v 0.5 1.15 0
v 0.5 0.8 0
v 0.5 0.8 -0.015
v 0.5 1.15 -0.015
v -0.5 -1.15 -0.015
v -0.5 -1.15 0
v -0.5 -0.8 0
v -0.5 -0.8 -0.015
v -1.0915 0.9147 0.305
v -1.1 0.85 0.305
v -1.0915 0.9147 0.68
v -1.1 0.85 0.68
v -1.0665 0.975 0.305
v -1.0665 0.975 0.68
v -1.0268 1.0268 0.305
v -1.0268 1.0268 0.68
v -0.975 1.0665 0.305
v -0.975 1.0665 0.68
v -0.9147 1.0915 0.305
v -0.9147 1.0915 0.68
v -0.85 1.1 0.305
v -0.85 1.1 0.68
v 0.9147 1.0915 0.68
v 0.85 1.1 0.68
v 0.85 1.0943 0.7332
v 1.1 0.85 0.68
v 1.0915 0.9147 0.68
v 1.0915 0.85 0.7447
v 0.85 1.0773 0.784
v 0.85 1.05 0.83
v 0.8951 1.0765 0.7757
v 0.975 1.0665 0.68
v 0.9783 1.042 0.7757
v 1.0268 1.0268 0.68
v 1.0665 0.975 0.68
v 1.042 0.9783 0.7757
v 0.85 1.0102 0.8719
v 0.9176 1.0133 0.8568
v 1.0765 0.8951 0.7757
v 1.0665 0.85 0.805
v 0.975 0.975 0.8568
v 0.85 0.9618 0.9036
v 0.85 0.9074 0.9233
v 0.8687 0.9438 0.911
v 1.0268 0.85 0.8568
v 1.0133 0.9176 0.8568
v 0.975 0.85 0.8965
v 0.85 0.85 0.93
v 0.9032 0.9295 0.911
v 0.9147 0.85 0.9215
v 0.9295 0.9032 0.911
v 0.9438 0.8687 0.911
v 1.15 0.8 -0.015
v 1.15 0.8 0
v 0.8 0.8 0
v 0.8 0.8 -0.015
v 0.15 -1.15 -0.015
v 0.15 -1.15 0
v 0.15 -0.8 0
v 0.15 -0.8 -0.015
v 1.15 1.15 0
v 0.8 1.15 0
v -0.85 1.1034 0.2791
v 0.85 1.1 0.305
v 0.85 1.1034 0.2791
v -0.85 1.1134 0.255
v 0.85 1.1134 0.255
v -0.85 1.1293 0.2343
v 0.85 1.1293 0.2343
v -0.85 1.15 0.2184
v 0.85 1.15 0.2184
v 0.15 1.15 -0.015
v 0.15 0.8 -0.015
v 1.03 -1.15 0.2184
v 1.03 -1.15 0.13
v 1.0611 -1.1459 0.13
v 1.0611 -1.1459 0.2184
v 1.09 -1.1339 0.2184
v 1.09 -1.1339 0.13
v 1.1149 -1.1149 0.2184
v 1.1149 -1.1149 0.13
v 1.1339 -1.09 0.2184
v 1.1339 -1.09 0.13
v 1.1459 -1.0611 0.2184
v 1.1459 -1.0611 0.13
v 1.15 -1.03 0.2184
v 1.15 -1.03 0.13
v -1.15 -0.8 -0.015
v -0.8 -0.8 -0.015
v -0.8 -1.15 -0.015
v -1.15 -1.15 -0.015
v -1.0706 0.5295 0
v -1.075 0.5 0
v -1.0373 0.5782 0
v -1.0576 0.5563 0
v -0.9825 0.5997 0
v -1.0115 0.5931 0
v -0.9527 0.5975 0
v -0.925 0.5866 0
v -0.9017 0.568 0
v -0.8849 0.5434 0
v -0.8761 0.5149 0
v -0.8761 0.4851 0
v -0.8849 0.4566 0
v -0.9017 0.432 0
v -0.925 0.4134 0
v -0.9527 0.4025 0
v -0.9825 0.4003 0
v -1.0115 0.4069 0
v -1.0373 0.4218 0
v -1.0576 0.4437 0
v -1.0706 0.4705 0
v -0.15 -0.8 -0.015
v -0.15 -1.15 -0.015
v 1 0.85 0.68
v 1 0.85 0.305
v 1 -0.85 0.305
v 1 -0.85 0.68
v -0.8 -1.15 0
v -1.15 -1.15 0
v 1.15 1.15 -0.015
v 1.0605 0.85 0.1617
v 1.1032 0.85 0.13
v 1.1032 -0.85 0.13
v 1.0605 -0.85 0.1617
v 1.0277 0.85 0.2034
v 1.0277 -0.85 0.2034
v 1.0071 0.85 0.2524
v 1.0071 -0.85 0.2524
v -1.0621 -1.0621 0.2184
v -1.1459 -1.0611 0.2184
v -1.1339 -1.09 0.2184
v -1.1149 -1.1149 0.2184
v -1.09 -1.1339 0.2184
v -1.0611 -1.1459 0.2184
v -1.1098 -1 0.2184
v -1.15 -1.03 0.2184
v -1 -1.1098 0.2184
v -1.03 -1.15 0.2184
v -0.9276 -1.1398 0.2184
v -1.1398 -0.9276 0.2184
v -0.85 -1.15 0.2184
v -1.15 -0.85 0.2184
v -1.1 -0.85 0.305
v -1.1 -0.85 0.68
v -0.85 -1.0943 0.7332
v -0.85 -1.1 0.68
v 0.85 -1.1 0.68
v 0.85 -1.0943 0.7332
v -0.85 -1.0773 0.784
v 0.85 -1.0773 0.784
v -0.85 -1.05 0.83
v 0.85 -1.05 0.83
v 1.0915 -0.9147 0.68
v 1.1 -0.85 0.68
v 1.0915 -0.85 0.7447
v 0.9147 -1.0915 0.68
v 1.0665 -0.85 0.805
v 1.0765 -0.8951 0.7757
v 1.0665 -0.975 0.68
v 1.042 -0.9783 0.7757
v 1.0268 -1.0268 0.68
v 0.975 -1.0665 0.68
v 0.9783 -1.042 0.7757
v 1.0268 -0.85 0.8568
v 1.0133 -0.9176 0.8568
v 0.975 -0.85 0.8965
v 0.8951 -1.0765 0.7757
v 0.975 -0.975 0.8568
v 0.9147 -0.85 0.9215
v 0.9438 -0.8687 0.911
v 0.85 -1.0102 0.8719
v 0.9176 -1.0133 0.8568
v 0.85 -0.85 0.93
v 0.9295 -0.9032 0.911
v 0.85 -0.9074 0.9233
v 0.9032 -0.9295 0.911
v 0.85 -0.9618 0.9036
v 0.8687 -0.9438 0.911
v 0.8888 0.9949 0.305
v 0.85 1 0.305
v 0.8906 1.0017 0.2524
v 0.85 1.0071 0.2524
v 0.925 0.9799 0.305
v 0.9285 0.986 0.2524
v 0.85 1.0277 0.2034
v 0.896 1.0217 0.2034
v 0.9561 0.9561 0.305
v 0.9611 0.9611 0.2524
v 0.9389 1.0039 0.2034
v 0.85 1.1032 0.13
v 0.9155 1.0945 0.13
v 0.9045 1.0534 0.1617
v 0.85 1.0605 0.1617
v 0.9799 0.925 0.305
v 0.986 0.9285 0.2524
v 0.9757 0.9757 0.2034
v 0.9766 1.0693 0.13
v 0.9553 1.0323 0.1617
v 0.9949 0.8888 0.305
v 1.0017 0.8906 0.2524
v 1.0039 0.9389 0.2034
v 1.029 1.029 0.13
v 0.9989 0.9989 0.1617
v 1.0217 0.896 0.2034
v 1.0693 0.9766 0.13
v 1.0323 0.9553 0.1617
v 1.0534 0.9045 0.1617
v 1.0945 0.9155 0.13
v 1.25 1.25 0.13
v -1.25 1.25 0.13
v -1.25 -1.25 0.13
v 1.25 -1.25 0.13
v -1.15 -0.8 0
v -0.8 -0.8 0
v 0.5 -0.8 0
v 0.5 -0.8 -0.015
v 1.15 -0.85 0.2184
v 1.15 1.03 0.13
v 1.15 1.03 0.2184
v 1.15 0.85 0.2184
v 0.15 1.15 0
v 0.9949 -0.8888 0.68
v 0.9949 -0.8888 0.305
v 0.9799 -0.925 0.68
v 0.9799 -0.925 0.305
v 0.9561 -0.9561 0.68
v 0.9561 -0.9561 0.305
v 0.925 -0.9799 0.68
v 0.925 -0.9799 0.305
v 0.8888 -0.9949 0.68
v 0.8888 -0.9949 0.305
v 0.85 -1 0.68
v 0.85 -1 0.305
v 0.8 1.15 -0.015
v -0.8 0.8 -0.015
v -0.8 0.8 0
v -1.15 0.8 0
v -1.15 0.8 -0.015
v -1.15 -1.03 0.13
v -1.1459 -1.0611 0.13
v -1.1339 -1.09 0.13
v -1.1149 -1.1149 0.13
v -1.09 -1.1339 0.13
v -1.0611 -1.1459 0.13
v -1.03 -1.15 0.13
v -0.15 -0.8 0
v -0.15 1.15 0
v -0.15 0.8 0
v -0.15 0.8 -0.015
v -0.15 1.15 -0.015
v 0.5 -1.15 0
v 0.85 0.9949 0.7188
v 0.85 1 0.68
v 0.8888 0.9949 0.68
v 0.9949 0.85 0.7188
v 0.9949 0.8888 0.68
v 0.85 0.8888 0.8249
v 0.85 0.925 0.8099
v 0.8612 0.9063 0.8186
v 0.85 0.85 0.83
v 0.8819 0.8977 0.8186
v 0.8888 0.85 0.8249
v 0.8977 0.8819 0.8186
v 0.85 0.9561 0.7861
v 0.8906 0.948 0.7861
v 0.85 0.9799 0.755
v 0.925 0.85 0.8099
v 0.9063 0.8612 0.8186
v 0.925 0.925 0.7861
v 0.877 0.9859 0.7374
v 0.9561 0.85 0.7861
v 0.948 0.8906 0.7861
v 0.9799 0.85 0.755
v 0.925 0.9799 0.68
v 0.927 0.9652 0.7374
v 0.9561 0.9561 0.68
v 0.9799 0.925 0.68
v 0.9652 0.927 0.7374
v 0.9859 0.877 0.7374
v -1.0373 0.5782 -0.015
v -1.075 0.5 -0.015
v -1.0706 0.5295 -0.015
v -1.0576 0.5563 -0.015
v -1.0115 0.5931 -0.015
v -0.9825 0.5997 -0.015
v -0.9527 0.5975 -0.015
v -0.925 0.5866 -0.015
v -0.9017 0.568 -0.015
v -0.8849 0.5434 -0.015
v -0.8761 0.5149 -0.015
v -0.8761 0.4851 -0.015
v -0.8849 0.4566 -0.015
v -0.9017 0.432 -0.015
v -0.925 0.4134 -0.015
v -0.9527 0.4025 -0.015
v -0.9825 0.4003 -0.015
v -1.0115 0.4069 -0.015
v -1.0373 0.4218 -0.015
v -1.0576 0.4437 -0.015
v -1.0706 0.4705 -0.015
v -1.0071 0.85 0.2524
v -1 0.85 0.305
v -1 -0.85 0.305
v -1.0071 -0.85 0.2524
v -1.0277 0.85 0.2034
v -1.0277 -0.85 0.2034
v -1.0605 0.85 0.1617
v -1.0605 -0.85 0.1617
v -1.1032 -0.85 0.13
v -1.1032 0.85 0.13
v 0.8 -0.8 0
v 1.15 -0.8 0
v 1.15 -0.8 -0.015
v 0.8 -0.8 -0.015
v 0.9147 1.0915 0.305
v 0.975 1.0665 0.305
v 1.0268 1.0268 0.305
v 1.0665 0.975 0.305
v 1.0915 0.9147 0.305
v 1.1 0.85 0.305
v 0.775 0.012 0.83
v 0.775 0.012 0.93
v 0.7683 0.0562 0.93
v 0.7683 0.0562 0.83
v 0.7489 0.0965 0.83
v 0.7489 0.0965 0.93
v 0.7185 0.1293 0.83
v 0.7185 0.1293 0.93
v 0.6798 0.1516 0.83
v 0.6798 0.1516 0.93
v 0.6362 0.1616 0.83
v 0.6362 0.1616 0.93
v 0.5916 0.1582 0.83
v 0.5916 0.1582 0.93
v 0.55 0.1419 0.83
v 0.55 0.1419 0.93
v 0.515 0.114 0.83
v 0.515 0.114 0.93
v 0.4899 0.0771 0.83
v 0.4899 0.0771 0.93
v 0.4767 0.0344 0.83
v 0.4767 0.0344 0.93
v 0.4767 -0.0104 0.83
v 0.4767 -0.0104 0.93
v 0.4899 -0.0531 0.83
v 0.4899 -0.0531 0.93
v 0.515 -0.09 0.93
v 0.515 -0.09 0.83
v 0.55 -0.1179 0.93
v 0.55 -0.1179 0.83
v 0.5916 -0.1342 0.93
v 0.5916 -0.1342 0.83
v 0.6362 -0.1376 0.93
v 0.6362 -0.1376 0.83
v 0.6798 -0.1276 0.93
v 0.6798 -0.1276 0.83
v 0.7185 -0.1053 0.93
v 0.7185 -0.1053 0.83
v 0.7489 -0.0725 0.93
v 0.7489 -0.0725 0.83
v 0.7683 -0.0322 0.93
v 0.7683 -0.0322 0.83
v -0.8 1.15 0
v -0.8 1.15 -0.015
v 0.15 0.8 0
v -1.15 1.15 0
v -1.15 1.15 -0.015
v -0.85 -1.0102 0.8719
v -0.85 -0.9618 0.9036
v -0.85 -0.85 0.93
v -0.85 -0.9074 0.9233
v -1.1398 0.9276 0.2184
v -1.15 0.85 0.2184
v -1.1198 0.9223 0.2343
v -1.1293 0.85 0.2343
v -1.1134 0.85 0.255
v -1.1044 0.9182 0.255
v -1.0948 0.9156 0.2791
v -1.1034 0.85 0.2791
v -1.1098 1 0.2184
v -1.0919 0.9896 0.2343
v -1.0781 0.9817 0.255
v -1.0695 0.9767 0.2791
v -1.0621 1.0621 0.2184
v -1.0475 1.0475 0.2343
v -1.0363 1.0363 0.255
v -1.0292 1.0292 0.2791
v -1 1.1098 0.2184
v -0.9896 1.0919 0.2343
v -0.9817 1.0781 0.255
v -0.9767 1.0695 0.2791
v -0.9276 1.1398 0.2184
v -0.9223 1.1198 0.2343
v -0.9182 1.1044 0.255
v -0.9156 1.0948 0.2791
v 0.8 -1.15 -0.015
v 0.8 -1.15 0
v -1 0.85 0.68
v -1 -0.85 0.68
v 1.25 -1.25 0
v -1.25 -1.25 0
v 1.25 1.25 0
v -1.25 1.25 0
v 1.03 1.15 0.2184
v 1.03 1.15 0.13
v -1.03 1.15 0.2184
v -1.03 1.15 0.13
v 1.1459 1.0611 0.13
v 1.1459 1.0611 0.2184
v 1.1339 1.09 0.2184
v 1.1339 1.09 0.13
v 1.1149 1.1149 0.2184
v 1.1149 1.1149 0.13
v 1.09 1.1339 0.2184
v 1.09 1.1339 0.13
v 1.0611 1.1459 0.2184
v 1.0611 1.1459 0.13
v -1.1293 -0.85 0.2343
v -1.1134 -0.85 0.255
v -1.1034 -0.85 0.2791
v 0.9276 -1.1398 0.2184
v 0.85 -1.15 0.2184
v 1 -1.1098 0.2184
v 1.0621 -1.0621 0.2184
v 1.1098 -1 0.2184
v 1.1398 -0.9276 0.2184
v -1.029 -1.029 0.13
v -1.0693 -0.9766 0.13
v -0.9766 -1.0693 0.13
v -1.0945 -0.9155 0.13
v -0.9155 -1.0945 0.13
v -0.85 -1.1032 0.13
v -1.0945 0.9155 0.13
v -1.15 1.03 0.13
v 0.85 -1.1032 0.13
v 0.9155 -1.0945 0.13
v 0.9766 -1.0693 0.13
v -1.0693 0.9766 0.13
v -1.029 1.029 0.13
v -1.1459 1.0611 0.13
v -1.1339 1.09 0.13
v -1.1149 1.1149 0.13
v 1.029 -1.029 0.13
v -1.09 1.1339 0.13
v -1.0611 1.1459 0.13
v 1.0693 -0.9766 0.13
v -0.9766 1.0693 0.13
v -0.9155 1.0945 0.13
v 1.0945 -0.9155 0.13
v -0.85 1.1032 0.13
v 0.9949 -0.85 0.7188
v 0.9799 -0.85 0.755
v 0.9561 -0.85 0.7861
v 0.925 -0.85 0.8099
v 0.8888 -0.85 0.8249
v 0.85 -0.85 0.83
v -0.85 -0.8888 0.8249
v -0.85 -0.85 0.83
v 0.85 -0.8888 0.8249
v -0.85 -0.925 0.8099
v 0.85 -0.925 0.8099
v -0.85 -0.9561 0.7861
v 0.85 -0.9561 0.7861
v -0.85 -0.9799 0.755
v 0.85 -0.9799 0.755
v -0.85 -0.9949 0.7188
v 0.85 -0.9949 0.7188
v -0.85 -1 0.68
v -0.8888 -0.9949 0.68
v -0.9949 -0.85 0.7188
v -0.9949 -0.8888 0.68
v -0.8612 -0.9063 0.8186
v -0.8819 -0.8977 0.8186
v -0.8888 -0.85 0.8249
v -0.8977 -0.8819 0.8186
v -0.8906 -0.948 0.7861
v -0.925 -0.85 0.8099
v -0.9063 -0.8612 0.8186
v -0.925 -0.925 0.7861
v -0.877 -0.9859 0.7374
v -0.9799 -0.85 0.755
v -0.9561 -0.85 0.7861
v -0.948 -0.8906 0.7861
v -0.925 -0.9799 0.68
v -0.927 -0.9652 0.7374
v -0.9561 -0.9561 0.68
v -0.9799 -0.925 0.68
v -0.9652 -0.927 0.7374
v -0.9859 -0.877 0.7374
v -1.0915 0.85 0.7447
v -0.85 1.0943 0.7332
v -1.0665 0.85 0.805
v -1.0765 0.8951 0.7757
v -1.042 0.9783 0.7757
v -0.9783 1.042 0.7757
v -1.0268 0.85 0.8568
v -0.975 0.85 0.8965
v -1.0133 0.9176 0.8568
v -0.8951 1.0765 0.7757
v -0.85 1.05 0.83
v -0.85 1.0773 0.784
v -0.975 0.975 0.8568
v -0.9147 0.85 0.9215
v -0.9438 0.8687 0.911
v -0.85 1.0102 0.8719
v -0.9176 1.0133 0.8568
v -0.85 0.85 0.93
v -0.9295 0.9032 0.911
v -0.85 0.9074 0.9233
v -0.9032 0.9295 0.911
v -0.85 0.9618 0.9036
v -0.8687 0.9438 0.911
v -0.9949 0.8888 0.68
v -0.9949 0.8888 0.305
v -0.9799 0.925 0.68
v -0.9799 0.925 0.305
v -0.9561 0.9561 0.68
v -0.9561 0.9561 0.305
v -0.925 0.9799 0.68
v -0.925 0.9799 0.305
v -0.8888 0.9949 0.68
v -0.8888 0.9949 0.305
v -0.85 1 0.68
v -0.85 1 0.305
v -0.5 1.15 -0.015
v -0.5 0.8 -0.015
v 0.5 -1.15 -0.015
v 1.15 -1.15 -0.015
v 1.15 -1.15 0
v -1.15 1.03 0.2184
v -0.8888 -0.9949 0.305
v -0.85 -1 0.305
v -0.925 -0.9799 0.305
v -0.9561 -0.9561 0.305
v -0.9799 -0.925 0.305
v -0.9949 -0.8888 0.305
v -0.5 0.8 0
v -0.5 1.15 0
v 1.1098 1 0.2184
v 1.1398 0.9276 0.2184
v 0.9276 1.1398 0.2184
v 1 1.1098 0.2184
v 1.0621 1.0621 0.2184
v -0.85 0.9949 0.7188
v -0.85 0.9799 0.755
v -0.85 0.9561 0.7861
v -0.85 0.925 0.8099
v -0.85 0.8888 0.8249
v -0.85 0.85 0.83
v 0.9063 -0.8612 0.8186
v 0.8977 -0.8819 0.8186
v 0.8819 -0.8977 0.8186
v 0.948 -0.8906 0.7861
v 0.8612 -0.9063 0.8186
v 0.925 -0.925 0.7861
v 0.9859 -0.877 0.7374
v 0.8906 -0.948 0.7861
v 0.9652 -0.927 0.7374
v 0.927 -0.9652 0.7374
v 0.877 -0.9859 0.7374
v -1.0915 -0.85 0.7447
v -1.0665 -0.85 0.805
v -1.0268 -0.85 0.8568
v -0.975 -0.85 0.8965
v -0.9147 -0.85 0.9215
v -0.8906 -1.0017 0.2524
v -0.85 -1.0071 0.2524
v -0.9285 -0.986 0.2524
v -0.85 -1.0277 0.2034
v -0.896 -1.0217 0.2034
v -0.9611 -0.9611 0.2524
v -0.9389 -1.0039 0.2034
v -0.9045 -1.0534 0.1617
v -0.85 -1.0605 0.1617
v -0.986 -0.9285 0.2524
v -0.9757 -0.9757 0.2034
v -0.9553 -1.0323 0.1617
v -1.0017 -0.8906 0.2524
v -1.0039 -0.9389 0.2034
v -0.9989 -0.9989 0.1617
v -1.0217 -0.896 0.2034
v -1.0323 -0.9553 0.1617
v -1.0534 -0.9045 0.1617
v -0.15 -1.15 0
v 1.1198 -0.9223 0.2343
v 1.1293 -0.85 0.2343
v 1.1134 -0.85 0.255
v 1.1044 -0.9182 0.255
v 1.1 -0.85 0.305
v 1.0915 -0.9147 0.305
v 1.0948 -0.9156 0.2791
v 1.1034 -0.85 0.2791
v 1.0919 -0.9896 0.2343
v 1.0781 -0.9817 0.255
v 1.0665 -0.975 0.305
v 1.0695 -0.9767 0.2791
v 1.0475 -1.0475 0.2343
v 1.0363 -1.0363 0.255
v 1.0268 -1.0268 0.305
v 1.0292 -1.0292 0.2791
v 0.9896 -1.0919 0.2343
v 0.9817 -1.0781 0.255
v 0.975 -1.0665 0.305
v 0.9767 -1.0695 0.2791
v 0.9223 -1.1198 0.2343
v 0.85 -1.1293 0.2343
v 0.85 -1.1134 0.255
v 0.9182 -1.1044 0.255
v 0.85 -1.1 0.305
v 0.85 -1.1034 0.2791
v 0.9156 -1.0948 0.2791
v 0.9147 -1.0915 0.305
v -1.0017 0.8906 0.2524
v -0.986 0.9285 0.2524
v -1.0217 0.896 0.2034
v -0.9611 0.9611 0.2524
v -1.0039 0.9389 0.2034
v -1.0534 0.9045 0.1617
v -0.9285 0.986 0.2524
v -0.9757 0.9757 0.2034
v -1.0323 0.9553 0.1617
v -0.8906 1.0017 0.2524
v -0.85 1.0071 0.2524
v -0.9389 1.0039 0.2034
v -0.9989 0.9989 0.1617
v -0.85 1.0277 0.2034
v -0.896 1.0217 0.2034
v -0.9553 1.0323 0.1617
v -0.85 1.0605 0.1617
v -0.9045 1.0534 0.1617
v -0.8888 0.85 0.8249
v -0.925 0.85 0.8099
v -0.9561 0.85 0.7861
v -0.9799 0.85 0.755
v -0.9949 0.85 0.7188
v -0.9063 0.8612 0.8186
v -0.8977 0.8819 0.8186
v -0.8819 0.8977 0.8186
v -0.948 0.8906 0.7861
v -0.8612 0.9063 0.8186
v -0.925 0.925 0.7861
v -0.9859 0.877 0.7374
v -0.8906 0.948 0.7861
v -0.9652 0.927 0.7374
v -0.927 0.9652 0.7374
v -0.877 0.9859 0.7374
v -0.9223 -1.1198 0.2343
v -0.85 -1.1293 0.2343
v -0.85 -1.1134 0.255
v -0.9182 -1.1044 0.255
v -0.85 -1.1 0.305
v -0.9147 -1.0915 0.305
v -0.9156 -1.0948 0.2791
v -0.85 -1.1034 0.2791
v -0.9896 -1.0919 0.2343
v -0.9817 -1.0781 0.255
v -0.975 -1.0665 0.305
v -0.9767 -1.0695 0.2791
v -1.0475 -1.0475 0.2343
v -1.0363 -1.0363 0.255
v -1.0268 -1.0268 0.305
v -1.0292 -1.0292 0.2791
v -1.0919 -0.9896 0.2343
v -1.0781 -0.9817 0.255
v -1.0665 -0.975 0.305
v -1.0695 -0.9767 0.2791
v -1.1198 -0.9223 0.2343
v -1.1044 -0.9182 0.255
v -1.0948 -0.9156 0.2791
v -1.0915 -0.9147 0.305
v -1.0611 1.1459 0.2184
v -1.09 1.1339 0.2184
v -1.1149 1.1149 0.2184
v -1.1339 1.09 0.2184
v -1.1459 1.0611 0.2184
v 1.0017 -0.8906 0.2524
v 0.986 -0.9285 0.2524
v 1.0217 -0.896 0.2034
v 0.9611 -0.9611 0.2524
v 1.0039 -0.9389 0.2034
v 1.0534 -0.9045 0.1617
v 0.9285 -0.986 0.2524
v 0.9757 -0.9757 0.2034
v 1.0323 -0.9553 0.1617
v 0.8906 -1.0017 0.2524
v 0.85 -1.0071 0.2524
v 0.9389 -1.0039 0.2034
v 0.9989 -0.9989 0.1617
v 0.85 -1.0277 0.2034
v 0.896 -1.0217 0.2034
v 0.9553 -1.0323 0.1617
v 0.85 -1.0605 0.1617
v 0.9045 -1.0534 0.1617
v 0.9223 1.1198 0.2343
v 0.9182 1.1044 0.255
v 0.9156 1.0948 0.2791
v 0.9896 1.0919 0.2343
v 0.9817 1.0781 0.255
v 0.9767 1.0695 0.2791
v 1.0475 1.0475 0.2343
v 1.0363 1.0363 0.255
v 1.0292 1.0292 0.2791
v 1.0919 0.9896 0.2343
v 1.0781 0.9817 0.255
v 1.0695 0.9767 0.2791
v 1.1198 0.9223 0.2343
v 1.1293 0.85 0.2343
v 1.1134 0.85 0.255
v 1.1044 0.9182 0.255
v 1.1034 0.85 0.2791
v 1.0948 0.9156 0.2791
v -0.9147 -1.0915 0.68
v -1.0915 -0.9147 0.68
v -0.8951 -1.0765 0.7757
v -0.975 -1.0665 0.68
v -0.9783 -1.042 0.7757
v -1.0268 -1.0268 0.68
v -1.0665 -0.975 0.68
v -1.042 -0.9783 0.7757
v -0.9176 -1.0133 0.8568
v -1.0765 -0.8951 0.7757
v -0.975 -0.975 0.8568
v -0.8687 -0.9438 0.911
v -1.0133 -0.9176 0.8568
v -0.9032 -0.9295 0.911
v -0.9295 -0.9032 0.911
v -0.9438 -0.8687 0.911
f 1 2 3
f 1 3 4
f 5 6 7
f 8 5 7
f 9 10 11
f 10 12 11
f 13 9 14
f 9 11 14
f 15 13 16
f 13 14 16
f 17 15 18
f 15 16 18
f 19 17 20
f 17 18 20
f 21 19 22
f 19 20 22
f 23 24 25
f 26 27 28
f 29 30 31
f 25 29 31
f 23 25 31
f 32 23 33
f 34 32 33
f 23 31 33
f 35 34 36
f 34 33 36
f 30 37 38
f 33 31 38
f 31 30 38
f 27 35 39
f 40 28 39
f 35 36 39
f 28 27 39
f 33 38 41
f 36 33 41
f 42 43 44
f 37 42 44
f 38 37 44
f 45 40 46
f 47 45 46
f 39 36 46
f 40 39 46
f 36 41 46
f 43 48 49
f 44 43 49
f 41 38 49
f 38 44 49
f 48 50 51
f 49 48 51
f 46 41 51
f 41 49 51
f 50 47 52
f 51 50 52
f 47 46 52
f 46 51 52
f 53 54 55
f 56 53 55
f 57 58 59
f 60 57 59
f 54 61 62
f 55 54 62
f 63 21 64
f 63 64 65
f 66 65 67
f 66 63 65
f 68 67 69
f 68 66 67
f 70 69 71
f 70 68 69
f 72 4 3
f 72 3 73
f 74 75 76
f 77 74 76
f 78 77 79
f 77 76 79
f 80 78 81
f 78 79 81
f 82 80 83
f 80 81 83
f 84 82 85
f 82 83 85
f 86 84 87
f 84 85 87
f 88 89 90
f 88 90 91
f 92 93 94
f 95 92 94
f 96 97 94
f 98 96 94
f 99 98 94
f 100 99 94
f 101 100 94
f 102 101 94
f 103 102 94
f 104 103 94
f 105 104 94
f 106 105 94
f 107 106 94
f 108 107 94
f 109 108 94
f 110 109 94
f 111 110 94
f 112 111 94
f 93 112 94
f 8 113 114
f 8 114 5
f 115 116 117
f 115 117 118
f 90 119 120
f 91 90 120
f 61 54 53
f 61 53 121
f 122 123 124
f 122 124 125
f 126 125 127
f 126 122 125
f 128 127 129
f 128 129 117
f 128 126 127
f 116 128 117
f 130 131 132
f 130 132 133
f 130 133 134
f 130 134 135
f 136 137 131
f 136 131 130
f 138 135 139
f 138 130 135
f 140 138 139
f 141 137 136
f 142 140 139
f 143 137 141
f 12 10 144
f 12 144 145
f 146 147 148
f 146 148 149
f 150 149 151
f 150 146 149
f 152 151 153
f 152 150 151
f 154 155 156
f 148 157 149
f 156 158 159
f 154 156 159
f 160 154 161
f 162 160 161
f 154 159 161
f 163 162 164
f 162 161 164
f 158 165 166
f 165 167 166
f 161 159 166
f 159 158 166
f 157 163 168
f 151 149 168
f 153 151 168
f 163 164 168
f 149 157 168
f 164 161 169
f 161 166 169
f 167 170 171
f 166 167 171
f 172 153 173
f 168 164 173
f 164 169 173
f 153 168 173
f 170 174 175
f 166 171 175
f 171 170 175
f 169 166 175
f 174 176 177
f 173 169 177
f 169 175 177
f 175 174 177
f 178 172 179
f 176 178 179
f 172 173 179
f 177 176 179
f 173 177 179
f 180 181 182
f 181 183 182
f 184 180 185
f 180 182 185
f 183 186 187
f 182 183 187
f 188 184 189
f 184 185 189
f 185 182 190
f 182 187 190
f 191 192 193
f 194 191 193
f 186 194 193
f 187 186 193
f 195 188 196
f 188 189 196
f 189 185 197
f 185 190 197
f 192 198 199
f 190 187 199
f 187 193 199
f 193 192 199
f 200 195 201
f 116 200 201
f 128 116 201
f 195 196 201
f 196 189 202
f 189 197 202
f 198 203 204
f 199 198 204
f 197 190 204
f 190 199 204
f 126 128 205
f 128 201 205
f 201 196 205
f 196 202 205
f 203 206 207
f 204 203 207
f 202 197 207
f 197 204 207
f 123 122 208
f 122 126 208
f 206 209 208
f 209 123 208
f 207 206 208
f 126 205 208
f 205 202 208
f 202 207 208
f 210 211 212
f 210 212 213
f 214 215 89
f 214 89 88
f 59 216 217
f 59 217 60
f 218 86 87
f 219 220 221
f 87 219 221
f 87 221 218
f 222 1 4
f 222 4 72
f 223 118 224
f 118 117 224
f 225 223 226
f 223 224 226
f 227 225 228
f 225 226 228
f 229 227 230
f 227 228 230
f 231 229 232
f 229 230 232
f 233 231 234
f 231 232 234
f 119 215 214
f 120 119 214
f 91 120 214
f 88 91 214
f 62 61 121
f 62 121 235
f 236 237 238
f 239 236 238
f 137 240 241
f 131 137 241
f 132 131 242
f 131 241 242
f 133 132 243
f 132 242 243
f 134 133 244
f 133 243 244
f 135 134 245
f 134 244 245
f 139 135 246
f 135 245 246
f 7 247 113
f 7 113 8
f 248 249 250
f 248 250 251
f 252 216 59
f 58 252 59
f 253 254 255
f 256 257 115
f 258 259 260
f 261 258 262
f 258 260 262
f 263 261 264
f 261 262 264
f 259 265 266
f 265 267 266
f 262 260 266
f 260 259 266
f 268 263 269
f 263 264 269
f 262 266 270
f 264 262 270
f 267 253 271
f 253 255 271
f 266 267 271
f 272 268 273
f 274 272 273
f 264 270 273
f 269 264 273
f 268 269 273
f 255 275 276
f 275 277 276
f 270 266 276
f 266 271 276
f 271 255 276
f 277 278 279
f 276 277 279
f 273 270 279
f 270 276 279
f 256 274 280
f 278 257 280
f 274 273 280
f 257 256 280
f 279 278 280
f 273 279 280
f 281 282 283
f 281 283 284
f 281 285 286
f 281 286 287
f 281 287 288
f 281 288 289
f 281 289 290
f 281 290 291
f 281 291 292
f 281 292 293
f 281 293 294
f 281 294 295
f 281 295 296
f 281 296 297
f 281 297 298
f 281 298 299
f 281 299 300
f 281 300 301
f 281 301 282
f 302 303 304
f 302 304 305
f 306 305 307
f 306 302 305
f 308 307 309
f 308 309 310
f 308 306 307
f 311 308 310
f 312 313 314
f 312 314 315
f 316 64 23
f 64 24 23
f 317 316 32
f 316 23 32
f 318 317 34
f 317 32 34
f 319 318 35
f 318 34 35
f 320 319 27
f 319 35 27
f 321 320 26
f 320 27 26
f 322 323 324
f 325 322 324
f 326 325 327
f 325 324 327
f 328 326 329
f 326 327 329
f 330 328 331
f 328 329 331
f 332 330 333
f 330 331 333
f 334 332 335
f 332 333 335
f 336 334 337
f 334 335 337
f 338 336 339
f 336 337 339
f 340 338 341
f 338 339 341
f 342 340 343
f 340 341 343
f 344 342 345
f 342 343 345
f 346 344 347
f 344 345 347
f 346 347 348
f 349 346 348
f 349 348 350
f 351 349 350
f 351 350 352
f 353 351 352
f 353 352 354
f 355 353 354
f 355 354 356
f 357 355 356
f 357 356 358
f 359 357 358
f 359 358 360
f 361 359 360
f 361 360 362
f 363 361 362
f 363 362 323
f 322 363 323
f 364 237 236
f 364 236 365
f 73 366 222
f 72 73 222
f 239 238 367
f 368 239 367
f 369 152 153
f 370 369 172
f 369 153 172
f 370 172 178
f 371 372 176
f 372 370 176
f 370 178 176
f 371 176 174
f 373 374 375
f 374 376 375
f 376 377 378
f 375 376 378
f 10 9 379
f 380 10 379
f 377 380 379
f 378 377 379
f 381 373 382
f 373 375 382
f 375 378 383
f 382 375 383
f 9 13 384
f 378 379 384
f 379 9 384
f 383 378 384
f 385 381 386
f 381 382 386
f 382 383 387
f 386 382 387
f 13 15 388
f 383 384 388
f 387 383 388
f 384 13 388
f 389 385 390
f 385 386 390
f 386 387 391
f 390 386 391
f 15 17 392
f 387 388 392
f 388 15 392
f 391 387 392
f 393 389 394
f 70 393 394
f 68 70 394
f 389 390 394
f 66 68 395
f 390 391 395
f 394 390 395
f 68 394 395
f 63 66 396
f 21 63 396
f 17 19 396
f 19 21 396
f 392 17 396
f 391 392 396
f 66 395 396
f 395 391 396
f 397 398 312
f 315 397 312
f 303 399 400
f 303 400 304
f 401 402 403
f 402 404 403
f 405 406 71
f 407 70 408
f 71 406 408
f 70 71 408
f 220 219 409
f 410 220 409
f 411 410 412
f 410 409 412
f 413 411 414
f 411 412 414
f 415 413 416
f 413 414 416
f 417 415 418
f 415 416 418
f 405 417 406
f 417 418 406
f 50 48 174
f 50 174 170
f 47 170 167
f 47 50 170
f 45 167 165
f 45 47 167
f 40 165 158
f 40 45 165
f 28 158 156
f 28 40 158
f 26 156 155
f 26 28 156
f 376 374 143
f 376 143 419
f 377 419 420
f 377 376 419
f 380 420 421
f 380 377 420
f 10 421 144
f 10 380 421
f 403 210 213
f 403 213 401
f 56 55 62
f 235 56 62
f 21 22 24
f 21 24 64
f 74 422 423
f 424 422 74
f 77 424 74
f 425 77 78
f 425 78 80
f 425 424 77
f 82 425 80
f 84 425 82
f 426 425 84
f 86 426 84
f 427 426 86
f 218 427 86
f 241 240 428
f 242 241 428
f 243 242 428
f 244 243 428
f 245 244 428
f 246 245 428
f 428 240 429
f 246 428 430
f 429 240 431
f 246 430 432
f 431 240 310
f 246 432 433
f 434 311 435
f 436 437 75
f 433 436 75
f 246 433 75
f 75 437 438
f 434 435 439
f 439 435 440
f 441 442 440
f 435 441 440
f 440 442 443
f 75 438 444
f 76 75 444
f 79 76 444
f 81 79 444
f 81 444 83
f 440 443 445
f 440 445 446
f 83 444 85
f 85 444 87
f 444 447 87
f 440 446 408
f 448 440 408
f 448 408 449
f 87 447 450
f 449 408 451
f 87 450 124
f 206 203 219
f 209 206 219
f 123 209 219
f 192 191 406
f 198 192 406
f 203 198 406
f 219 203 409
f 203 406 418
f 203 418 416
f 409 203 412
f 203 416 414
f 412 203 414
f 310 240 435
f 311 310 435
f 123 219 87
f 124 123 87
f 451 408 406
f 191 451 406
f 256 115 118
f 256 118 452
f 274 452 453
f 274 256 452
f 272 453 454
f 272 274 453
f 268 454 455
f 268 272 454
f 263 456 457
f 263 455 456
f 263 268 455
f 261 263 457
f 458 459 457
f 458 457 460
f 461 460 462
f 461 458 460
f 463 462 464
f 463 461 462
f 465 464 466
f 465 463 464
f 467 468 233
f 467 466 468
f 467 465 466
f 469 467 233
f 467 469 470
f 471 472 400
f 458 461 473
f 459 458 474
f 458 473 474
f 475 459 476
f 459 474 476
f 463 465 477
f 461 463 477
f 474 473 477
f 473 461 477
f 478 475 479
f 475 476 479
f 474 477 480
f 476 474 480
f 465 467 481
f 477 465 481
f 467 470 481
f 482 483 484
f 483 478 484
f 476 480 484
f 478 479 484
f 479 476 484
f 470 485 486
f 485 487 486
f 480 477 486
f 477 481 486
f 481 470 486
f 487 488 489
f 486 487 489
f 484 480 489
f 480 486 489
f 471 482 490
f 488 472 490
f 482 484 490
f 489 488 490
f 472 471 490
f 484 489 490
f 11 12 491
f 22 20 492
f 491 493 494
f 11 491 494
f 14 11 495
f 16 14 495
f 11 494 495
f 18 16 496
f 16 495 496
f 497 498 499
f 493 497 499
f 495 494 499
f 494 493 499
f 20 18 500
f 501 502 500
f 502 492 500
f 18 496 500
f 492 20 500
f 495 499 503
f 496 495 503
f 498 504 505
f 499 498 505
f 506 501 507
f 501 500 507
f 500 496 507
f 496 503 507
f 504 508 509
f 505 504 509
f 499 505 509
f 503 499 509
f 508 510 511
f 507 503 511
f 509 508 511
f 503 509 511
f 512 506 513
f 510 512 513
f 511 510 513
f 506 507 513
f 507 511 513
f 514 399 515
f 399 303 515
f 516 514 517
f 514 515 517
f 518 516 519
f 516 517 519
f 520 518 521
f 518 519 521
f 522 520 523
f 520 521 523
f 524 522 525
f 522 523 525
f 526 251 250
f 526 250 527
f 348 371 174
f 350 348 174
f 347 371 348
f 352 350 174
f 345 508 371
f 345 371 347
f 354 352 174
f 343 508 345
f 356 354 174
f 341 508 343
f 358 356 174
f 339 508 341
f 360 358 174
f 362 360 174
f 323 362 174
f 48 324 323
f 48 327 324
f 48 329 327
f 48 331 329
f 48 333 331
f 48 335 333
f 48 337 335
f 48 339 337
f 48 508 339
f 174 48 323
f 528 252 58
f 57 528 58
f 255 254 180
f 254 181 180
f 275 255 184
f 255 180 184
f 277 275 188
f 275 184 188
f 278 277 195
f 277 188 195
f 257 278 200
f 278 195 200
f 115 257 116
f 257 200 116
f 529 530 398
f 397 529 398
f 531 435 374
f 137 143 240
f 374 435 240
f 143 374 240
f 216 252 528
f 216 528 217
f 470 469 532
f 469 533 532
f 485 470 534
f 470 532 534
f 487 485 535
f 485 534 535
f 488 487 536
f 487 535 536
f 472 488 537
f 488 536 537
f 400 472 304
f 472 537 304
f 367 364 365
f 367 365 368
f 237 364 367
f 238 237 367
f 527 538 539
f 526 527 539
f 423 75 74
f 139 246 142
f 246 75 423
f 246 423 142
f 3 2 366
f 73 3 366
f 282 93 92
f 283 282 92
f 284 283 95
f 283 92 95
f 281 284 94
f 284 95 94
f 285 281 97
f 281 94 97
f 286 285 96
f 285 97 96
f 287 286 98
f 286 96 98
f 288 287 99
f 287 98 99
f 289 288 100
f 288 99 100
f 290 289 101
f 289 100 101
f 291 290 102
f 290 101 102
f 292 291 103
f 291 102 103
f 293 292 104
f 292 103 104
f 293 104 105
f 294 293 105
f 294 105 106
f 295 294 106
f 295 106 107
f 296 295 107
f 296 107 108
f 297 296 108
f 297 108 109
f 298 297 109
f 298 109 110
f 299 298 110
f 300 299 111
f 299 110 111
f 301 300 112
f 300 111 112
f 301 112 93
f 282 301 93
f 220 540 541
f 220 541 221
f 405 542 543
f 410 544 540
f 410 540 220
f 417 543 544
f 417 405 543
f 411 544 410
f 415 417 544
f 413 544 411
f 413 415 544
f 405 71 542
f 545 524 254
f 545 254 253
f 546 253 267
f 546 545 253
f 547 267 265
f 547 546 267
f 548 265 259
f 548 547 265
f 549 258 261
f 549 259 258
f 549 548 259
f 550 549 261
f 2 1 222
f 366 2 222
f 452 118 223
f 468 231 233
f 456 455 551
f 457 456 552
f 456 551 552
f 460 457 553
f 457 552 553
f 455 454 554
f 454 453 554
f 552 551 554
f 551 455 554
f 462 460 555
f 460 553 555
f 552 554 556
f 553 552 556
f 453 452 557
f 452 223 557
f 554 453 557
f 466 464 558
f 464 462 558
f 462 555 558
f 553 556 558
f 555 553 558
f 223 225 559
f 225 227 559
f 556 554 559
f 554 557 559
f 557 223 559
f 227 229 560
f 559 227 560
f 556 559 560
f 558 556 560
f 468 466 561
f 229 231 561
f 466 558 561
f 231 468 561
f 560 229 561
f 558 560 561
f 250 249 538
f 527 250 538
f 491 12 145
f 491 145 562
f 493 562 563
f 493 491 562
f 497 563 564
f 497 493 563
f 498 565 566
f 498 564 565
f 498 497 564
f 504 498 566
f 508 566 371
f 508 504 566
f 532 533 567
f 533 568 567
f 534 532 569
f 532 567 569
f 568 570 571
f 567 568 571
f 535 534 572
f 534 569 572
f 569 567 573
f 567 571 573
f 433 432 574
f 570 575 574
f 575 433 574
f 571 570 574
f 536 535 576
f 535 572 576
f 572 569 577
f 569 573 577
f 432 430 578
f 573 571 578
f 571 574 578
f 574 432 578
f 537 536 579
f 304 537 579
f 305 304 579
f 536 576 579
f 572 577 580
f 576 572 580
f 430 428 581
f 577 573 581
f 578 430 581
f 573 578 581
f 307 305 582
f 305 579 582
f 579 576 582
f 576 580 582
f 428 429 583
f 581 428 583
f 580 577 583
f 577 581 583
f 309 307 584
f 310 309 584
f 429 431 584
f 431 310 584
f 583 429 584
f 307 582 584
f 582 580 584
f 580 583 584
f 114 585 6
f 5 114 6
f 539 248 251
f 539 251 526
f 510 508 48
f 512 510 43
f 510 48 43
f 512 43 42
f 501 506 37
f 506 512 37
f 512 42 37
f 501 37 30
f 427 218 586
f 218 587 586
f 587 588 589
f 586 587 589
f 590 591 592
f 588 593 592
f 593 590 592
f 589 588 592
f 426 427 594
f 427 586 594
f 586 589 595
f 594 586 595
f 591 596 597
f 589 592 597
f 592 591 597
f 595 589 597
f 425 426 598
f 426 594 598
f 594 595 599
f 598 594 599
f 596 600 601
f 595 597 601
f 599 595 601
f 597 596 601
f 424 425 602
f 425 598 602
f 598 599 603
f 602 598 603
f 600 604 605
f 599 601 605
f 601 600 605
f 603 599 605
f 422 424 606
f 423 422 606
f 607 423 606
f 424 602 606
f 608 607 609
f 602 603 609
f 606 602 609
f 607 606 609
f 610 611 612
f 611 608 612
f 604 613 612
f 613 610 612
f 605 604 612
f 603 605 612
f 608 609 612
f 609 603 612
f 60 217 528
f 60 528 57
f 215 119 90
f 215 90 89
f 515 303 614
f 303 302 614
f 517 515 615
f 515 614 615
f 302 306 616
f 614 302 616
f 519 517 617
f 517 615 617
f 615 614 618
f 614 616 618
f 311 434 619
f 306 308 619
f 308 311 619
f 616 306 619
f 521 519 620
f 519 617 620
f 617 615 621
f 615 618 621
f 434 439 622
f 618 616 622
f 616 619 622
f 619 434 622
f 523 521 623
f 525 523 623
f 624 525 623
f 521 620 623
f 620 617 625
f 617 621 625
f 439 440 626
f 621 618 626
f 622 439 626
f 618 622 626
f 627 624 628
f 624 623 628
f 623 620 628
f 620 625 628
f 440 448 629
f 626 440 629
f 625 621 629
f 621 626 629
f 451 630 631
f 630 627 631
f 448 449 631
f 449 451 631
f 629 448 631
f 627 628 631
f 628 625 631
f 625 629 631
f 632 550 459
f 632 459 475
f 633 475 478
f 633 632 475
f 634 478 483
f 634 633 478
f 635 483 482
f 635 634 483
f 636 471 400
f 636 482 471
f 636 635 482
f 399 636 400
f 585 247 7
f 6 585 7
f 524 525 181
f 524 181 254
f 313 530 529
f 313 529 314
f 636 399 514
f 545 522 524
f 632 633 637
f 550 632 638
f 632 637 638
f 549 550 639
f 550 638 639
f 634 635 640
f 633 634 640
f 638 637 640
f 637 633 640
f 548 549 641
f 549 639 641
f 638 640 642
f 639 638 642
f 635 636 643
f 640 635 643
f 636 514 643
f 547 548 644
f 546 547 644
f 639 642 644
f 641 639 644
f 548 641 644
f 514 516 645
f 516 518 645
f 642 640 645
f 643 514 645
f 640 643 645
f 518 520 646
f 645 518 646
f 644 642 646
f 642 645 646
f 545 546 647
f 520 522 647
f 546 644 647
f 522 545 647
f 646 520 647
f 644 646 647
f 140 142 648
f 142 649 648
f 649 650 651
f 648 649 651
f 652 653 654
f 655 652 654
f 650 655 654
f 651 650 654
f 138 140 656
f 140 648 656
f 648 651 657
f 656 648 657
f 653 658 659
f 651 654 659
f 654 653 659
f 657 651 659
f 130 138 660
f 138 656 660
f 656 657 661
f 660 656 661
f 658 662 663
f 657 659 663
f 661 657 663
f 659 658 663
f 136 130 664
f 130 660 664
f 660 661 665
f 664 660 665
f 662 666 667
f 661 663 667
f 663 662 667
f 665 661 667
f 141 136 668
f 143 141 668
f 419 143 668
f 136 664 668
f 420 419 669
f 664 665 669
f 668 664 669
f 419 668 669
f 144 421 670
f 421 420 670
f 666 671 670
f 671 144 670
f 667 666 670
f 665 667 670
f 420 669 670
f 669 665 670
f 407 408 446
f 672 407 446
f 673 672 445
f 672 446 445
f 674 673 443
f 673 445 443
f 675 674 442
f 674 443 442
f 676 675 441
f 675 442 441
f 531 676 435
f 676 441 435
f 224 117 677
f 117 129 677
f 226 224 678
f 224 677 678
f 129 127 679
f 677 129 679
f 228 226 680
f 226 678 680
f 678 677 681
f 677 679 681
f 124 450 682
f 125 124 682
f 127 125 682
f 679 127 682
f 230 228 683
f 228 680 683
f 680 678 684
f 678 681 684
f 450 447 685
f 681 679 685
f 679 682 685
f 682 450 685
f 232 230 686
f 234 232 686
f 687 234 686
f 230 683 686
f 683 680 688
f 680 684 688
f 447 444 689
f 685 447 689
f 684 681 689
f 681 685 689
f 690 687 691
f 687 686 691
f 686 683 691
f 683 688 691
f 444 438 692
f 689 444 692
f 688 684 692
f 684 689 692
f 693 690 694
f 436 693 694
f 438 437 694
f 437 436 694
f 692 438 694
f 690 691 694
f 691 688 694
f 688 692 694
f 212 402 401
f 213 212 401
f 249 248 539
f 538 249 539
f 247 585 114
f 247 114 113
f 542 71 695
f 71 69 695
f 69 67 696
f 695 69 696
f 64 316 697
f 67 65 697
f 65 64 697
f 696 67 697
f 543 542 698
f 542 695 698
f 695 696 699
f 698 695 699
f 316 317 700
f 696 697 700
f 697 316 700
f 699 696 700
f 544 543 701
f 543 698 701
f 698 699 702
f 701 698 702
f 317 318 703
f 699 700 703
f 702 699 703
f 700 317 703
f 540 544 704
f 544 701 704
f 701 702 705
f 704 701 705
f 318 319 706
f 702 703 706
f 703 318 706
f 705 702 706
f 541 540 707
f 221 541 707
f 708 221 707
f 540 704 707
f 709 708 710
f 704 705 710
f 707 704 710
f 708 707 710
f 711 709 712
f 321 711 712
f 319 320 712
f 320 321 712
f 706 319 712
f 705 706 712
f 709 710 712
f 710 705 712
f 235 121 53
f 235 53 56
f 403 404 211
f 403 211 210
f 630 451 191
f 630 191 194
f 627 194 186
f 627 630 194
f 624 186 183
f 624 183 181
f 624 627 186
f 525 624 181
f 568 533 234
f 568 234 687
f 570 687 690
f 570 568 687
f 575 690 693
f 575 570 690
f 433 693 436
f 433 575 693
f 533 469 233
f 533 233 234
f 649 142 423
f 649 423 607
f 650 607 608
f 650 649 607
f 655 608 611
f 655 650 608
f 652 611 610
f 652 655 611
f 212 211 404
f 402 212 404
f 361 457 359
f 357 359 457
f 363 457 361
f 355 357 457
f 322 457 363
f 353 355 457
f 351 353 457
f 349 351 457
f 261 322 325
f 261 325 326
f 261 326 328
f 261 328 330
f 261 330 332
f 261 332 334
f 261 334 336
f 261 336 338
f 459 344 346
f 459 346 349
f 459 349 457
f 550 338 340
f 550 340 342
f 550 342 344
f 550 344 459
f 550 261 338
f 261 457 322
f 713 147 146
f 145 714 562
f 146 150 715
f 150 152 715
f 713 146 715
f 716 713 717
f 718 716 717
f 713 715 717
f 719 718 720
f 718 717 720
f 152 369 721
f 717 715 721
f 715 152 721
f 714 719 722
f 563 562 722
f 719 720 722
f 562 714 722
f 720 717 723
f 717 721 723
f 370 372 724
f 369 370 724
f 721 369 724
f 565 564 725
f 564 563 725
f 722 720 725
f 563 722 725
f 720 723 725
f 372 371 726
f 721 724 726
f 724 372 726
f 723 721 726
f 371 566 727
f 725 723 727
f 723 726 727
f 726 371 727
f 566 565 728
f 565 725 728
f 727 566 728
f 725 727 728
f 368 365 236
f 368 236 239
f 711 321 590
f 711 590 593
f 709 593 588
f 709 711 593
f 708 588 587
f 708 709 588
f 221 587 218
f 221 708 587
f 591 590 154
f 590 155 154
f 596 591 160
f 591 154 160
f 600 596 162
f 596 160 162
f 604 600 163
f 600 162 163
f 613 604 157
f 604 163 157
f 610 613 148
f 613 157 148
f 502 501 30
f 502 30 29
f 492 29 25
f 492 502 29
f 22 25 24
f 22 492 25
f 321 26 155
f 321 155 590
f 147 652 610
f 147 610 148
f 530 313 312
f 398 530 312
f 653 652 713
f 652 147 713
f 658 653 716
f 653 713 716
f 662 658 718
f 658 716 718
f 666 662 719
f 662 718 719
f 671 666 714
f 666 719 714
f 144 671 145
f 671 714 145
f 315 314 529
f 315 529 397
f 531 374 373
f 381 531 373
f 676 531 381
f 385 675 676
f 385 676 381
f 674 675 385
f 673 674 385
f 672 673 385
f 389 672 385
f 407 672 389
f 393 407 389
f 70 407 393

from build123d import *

# Parameters (mm, degrees)
SKETCH_1_W               = 2.5
SKETCH_1_H               = 0.13
EXTRUDE_1_DEPTH          = 1.25
EXTRUDE_2_DEPTH          = 1.25
PATTERN_CIRCULAR_1_COUNT = 2
PATTERN_CIRCULAR_1_ANGLE = 90
SKETCH_2_W               = 0.4
SKETCH_2_H               = 0.4
CUT_EXTRUDE_1_DEPTH      = 2.940360791
CUT_EXTRUDE_2_DEPTH      = 3.614842251
CUT_EXTRUDE_3_DEPTH      = 3.614842251
REVOLVE_1_ANGLE          = 90
REVOLVE_2_ANGLE          = 90
REVOLVE_3_ANGLE          = 90
REVOLVE_4_ANGLE          = 90
EXTRUDE_3_DEPTH          = 0.0884
SKETCH_10_R              = 0.15
CUT_EXTRUDE_4_DEPTH      = 0.8
SKETCH_11_R              = 0.1
EXTRUDE_4_DEPTH          = 0.015
SKETCH_11_W              = 0.35
SKETCH_11_H              = 0.35
EXTRUDE_4_2_DEPTH        = 0.015
EXTRUDE_4_3_DEPTH        = 0.015
EXTRUDE_4_4_DEPTH        = 0.015
EXTRUDE_4_5_DEPTH        = 0.015
EXTRUDE_4_6_DEPTH        = 0.015
EXTRUDE_4_7_DEPTH        = 0.015
EXTRUDE_4_8_DEPTH        = 0.015
EXTRUDE_4_9_DEPTH        = 0.015


with BuildPart() as part:
    # Эскиз1 → Бобышка-Вытянуть1 (new, symmetric)
    with BuildSketch(Plane(origin=(0, 0, 0), x_dir=(1, 0, 0), z_dir=(0, 1, 0))):
        with Locations((0, -0.065)):
            Rectangle(SKETCH_1_W, SKETCH_1_H)
    extrude(amount=EXTRUDE_1_DEPTH, both=True)


with BuildPart() as body_2:
    # Эскиз1<3> → Бобышка-Вытянуть2 (new, symmetric)
    with BuildSketch(Plane(origin=(0, 0, 0), x_dir=(1, 0, 0), z_dir=(0, 1, 0))):
        with BuildLine():
            Line((-1.103175416, -0.13), (-1.15, -0.13))
            Line((-1.15, -0.13), (-1.15, -0.21839746))
            ThreePointArc((-1.15, -0.21839746), (-1.11339746, -0.255), (-1.1, -0.305))
            Line((-1.1, -0.305), (-1.1, -0.68))
            ThreePointArc((-1.1, -0.68), (-1.026776695, -0.856776695), (-0.85, -0.93))
            Line((-0.85, -0.93), (0, -0.93))
            Line((0, -0.93), (0, -0.83))
            Line((0, -0.83), (-0.85, -0.83))
            ThreePointArc((-0.85, -0.83), (-0.956066017, -0.786066017), (-1, -0.68))
            Line((-1, -0.68), (-1, -0.305))
            ThreePointArc((-1, -0.305), (-1.027714022, -0.2034247), (-1.103175416, -0.13))
        make_face()
        with BuildLine():
            Line((1.15, -0.21839746), (1.15, -0.13))
            Line((1.15, -0.13), (1.103175416, -0.13))
            ThreePointArc((1.103175416, -0.13), (1.027714022, -0.2034247), (1, -0.305))
            Line((1, -0.305), (1, -0.68))
            ThreePointArc((1, -0.68), (0.956066017, -0.786066017), (0.85, -0.83))
            Line((0.85, -0.83), (0, -0.83))
            Line((0, -0.83), (0, -0.93))
            Line((0, -0.93), (0.85, -0.93))
            ThreePointArc((0.85, -0.93), (1.026776695, -0.856776695), (1.1, -0.68))
            Line((1.1, -0.68), (1.1, -0.305))
            ThreePointArc((1.1, -0.305), (1.11339746, -0.255), (1.15, -0.21839746))
        make_face()
    extrude(amount=EXTRUDE_2_DEPTH, both=True)


with BuildPart() as pattern_circular_1_1:
    # Круговой массив1: pattern copy
    add(body_2.part.rotate(Axis((0, 0, 0), (0, 0, 1)), 1 * PATTERN_CIRCULAR_1_ANGLE / (PATTERN_CIRCULAR_1_COUNT - 1)))


with BuildPart() as cut_extrude_1_tool:
    # Эскиз2 → Вырез-Вытянуть1 (new, through all)
    with BuildSketch(Plane.XY.offset(0.13)):
        with Locations((-1.05, 1.05)):
            Rectangle(SKETCH_2_W, SKETCH_2_H)
        with Locations((1.05, 1.05)):
            Rectangle(SKETCH_2_W, SKETCH_2_H)
        with Locations((-1.05, -1.05)):
            Rectangle(SKETCH_2_W, SKETCH_2_H)
        with Locations((1.05, -1.05)):
            Rectangle(SKETCH_2_W, SKETCH_2_H)
    extrude(amount=CUT_EXTRUDE_1_DEPTH)


with BuildPart() as body_2_1:
    add(body_2.part)

    # Вырез-Вытянуть1: cut by cut_extrude_1_tool
    add(cut_extrude_1_tool.part, mode=Mode.SUBTRACT)

    # Эскиз4 → Вырез-Вытянуть3 (cut, through all)
    with BuildSketch(Plane(origin=(0.85, 0, 0), x_dir=(0, 0, -1), z_dir=(1, 0, 0))):
        with BuildLine():
            ThreePointArc((-0.83, -1.05), (-0.903606798, -0.961803399), (-0.93, -0.85))
            Line((-0.93, -0.85), (-0.93, -1.25))
            Line((-0.93, -1.25), (-0.83, -1.25))
            Line((-0.83, -1.25), (-0.83, -1.05))
        make_face()
        with BuildLine():
            Line((-0.93, 1.25), (-0.93, 0.85))
            ThreePointArc((-0.93, 0.85), (-0.903606798, 0.961803399), (-0.83, 1.05))
            Line((-0.83, 1.05), (-0.83, 1.25))
            Line((-0.83, 1.25), (-0.93, 1.25))
        make_face()
    extrude(amount=-CUT_EXTRUDE_3_DEPTH, mode=Mode.SUBTRACT)



with BuildPart() as pattern_circular_1_1_1:
    add(pattern_circular_1_1.part)

    # Вырез-Вытянуть1: cut by cut_extrude_1_tool
    add(cut_extrude_1_tool.part, mode=Mode.SUBTRACT)

    # Эскиз3 → Вырез-Вытянуть2 (cut, through all)
    with BuildSketch(Plane.XZ.offset(0.85)):
        with BuildLine():
            ThreePointArc((-1.05, 0.83), (-0.961803399, 0.903606798), (-0.85, 0.93))
            Line((-0.85, 0.93), (-1.25, 0.93))
            Line((-1.25, 0.93), (-1.25, 0.83))
            Line((-1.25, 0.83), (-1.05, 0.83))
        make_face()
        with BuildLine():
            Line((1.25, 0.93), (0.85, 0.93))
            ThreePointArc((0.85, 0.93), (0.961803399, 0.903606798), (1.05, 0.83))
            Line((1.05, 0.83), (1.25, 0.83))
            Line((1.25, 0.83), (1.25, 0.93))
        make_face()
    extrude(amount=-CUT_EXTRUDE_2_DEPTH, mode=Mode.SUBTRACT)


with BuildPart() as body_2_2:
    add(body_2_1.part)

    add(pattern_circular_1_1_1.part)  # Повернуть1 merges Круговой массив1_1
    # Эскиз5 → Повернуть1 (revolve)
    with BuildSketch(Plane(origin=(0.85, 0, 0), x_dir=(0, 0, -1), z_dir=(1, 0, 0))):
        with BuildLine():
            Line((-0.68, 1), (-0.305, 1))
            ThreePointArc((-0.305, 1), (-0.2034247, 1.027714022), (-0.13, 1.103175416))
            Line((-0.13, 1.103175416), (-0.13, 1.15))
            Line((-0.13, 1.15), (-0.21839746, 1.15))
            ThreePointArc((-0.21839746, 1.15), (-0.255, 1.11339746), (-0.305, 1.1))
            Line((-0.305, 1.1), (-0.68, 1.1))
            ThreePointArc((-0.68, 1.1), (-0.856776695, 1.026776695), (-0.93, 0.85))
            Line((-0.93, 0.85), (-0.83, 0.85))
            ThreePointArc((-0.83, 0.85), (-0.786066017, 0.956066017), (-0.68, 1))
        make_face()
    revolve(axis=Axis((0.85, 0.85, 0.93), (0, 0, -1)), revolution_arc=REVOLVE_1_ANGLE)

    # Эскиз6 → Повернуть2 (revolve)
    with BuildSketch(Plane.XZ.offset(0.85)):
        with BuildLine():
            Line((0.85, 0.93), (0.85, 0.83))
            ThreePointArc((0.85, 0.83), (0.956066017, 0.786066017), (1, 0.68))
            Line((1, 0.68), (1, 0.305))
            ThreePointArc((1, 0.305), (1.027714022, 0.2034247), (1.103175416, 0.13))
            Line((1.103175416, 0.13), (1.15, 0.13))
            Line((1.15, 0.13), (1.15, 0.21839746))
            ThreePointArc((1.15, 0.21839746), (1.11339746, 0.255), (1.1, 0.305))
            Line((1.1, 0.305), (1.1, 0.68))
            ThreePointArc((1.1, 0.68), (1.026776695, 0.856776695), (0.85, 0.93))
        make_face()
    revolve(axis=Axis((0.85, -0.85, 0.93), (0, 0, -1)), revolution_arc=REVOLVE_2_ANGLE)

    # Эскиз7 → Повернуть3 (revolve)
    with BuildSketch(Plane.ZY.offset(0.85)):
        with BuildLine():
            Line((0.93, -0.85), (0.83, -0.85))
            ThreePointArc((0.83, -0.85), (0.786066017, -0.956066017), (0.68, -1))
            Line((0.68, -1), (0.305, -1))
            ThreePointArc((0.305, -1), (0.2034247, -1.027714022), (0.13, -1.103175416))
            Line((0.13, -1.103175416), (0.13, -1.15))
            Line((0.13, -1.15), (0.21839746, -1.15))
            ThreePointArc((0.21839746, -1.15), (0.255, -1.11339746), (0.305, -1.1))
            Line((0.305, -1.1), (0.68, -1.1))
            ThreePointArc((0.68, -1.1), (0.856776695, -1.026776695), (0.93, -0.85))
        make_face()
    revolve(axis=Axis((-0.85, -0.85, 0.93), (0, 0, -1)), revolution_arc=REVOLVE_3_ANGLE)

    # Эскиз8 → Повернуть4 (revolve)
    with BuildSketch(Plane(origin=(0, 0.85, 0), x_dir=(1, 0, 0), z_dir=(0, 1, 0))):
        with BuildLine():
            Line((-0.85, -0.93), (-0.85, -0.83))
            ThreePointArc((-0.85, -0.83), (-0.956066017, -0.786066017), (-1, -0.68))
            Line((-1, -0.68), (-1, -0.305))
            ThreePointArc((-1, -0.305), (-1.027714022, -0.2034247), (-1.103175416, -0.13))
            Line((-1.103175416, -0.13), (-1.15, -0.13))
            Line((-1.15, -0.13), (-1.15, -0.21839746))
            ThreePointArc((-1.15, -0.21839746), (-1.11339746, -0.255), (-1.1, -0.305))
            Line((-1.1, -0.305), (-1.1, -0.68))
            ThreePointArc((-1.1, -0.68), (-1.026776695, -0.856776695), (-0.85, -0.93))
        make_face()
    revolve(axis=Axis((-0.85, 0.85, 0.93), (0, 0, -1)), revolution_arc=REVOLVE_4_ANGLE)

    # Эскиз9 → Бобышка-Вытянуть3 (add)
    with BuildSketch(Plane.XY.offset(0.13)):
        with BuildLine():
            Line((-0.85, 1.15), (-1.03, 1.15))
            ThreePointArc((-1.03, 1.15), (-1.114852814, 1.114852814), (-1.15, 1.03))
            Line((-1.15, 1.03), (-1.15, 0.85))
            ThreePointArc((-1.15, 0.85), (-1.062132034, 1.062132034), (-0.85, 1.15))
        make_face()
        with BuildLine():
            Line((1.03, 1.15), (0.85, 1.15))
            ThreePointArc((0.85, 1.15), (1.062132034, 1.062132034), (1.15, 0.85))
            Line((1.15, 0.85), (1.15, 1.03))
            ThreePointArc((1.15, 1.03), (1.114852814, 1.114852814), (1.03, 1.15))
        make_face()
        with BuildLine():
            ThreePointArc((-0.85, -1.15), (-1.062132034, -1.062132034), (-1.15, -0.85))
            Line((-1.15, -0.85), (-1.15, -1.03))
            ThreePointArc((-1.15, -1.03), (-1.114852814, -1.114852814), (-1.03, -1.15))
            Line((-1.03, -1.15), (-0.85, -1.15))
        make_face()
        with BuildLine():
            Line((1.15, -1.03), (1.15, -0.85))
            ThreePointArc((1.15, -0.85), (1.062132034, -1.062132034), (0.85, -1.15))
            Line((0.85, -1.15), (1.03, -1.15))
            ThreePointArc((1.03, -1.15), (1.114852814, -1.114852814), (1.15, -1.03))
        make_face()
    extrude(amount=EXTRUDE_3_DEPTH)

    # Эскиз10 → Вырез-Вытянуть4 (cut)
    with BuildSketch(Plane.XY.offset(0.93)):
        with Locations((0.625, 0.012)):
            Circle(SKETCH_10_R)
    extrude(amount=-CUT_EXTRUDE_4_DEPTH, mode=Mode.SUBTRACT)


with BuildPart() as body_3:
    # Эскиз11 → Бобышка-Вытянуть4 (new body)
    with BuildSketch(Plane(origin=(0, 0, 0), x_dir=(-1, 0, 0), z_dir=(0, 0, -1))):
        with Locations((0.975, 0.5)):
            Circle(SKETCH_11_R)
    extrude(amount=EXTRUDE_4_DEPTH)


with BuildPart() as body_4:
    # Эскиз11 → Extrude 4 2 (new body)
    with BuildSketch(Plane(origin=(0, 0, 0), x_dir=(-1, 0, 0), z_dir=(0, 0, -1))):
        with Locations((-0.975, 0.975)):
            Rectangle(SKETCH_11_W, SKETCH_11_H)
    extrude(amount=EXTRUDE_4_2_DEPTH)


with BuildPart() as body_5:
    # Эскиз11 → Extrude 4 3 (new body)
    with BuildSketch(Plane(origin=(0, 0, 0), x_dir=(-1, 0, 0), z_dir=(0, 0, -1))):
        with Locations((-0.325, 0.975)):
            Rectangle(SKETCH_11_W, SKETCH_11_H)
    extrude(amount=EXTRUDE_4_3_DEPTH)


with BuildPart() as body_6:
    # Эскиз11 → Extrude 4 4 (new body)
    with BuildSketch(Plane(origin=(0, 0, 0), x_dir=(-1, 0, 0), z_dir=(0, 0, -1))):
        with Locations((0.325, 0.975)):
            Rectangle(SKETCH_11_W, SKETCH_11_H)
    extrude(amount=EXTRUDE_4_4_DEPTH)


with BuildPart() as body_7:
    # Эскиз11 → Extrude 4 5 (new body)
    with BuildSketch(Plane(origin=(0, 0, 0), x_dir=(-1, 0, 0), z_dir=(0, 0, -1))):
        with Locations((0.975, 0.975)):
            Rectangle(SKETCH_11_W, SKETCH_11_H)
    extrude(amount=EXTRUDE_4_5_DEPTH)


with BuildPart() as body_8:
    # Эскиз11 → Extrude 4 6 (new body)
    with BuildSketch(Plane(origin=(0, 0, 0), x_dir=(-1, 0, 0), z_dir=(0, 0, -1))):
        with Locations((-0.975, -0.975)):
            Rectangle(SKETCH_11_W, SKETCH_11_H)
    extrude(amount=EXTRUDE_4_6_DEPTH)


with BuildPart() as body_9:
    # Эскиз11 → Extrude 4 7 (new body)
    with BuildSketch(Plane(origin=(0, 0, 0), x_dir=(-1, 0, 0), z_dir=(0, 0, -1))):
        with Locations((-0.325, -0.975)):
            Rectangle(SKETCH_11_W, SKETCH_11_H)
    extrude(amount=EXTRUDE_4_7_DEPTH)


with BuildPart() as body_10:
    # Эскиз11 → Extrude 4 8 (new body)
    with BuildSketch(Plane(origin=(0, 0, 0), x_dir=(-1, 0, 0), z_dir=(0, 0, -1))):
        with Locations((0.325, -0.975)):
            Rectangle(SKETCH_11_W, SKETCH_11_H)
    extrude(amount=EXTRUDE_4_8_DEPTH)


with BuildPart() as body_11:
    # Эскиз11 → Extrude 4 9 (new body)
    with BuildSketch(Plane(origin=(0, 0, 0), x_dir=(-1, 0, 0), z_dir=(0, 0, -1))):
        with Locations((0.975, -0.975)):
            Rectangle(SKETCH_11_W, SKETCH_11_H)
    extrude(amount=EXTRUDE_4_9_DEPTH)


solid = Compound([part.part, body_2_2.part, body_3.part, body_4.part, body_5.part, body_6.part, body_7.part, body_8.part, body_9.part, body_10.part, body_11.part])
